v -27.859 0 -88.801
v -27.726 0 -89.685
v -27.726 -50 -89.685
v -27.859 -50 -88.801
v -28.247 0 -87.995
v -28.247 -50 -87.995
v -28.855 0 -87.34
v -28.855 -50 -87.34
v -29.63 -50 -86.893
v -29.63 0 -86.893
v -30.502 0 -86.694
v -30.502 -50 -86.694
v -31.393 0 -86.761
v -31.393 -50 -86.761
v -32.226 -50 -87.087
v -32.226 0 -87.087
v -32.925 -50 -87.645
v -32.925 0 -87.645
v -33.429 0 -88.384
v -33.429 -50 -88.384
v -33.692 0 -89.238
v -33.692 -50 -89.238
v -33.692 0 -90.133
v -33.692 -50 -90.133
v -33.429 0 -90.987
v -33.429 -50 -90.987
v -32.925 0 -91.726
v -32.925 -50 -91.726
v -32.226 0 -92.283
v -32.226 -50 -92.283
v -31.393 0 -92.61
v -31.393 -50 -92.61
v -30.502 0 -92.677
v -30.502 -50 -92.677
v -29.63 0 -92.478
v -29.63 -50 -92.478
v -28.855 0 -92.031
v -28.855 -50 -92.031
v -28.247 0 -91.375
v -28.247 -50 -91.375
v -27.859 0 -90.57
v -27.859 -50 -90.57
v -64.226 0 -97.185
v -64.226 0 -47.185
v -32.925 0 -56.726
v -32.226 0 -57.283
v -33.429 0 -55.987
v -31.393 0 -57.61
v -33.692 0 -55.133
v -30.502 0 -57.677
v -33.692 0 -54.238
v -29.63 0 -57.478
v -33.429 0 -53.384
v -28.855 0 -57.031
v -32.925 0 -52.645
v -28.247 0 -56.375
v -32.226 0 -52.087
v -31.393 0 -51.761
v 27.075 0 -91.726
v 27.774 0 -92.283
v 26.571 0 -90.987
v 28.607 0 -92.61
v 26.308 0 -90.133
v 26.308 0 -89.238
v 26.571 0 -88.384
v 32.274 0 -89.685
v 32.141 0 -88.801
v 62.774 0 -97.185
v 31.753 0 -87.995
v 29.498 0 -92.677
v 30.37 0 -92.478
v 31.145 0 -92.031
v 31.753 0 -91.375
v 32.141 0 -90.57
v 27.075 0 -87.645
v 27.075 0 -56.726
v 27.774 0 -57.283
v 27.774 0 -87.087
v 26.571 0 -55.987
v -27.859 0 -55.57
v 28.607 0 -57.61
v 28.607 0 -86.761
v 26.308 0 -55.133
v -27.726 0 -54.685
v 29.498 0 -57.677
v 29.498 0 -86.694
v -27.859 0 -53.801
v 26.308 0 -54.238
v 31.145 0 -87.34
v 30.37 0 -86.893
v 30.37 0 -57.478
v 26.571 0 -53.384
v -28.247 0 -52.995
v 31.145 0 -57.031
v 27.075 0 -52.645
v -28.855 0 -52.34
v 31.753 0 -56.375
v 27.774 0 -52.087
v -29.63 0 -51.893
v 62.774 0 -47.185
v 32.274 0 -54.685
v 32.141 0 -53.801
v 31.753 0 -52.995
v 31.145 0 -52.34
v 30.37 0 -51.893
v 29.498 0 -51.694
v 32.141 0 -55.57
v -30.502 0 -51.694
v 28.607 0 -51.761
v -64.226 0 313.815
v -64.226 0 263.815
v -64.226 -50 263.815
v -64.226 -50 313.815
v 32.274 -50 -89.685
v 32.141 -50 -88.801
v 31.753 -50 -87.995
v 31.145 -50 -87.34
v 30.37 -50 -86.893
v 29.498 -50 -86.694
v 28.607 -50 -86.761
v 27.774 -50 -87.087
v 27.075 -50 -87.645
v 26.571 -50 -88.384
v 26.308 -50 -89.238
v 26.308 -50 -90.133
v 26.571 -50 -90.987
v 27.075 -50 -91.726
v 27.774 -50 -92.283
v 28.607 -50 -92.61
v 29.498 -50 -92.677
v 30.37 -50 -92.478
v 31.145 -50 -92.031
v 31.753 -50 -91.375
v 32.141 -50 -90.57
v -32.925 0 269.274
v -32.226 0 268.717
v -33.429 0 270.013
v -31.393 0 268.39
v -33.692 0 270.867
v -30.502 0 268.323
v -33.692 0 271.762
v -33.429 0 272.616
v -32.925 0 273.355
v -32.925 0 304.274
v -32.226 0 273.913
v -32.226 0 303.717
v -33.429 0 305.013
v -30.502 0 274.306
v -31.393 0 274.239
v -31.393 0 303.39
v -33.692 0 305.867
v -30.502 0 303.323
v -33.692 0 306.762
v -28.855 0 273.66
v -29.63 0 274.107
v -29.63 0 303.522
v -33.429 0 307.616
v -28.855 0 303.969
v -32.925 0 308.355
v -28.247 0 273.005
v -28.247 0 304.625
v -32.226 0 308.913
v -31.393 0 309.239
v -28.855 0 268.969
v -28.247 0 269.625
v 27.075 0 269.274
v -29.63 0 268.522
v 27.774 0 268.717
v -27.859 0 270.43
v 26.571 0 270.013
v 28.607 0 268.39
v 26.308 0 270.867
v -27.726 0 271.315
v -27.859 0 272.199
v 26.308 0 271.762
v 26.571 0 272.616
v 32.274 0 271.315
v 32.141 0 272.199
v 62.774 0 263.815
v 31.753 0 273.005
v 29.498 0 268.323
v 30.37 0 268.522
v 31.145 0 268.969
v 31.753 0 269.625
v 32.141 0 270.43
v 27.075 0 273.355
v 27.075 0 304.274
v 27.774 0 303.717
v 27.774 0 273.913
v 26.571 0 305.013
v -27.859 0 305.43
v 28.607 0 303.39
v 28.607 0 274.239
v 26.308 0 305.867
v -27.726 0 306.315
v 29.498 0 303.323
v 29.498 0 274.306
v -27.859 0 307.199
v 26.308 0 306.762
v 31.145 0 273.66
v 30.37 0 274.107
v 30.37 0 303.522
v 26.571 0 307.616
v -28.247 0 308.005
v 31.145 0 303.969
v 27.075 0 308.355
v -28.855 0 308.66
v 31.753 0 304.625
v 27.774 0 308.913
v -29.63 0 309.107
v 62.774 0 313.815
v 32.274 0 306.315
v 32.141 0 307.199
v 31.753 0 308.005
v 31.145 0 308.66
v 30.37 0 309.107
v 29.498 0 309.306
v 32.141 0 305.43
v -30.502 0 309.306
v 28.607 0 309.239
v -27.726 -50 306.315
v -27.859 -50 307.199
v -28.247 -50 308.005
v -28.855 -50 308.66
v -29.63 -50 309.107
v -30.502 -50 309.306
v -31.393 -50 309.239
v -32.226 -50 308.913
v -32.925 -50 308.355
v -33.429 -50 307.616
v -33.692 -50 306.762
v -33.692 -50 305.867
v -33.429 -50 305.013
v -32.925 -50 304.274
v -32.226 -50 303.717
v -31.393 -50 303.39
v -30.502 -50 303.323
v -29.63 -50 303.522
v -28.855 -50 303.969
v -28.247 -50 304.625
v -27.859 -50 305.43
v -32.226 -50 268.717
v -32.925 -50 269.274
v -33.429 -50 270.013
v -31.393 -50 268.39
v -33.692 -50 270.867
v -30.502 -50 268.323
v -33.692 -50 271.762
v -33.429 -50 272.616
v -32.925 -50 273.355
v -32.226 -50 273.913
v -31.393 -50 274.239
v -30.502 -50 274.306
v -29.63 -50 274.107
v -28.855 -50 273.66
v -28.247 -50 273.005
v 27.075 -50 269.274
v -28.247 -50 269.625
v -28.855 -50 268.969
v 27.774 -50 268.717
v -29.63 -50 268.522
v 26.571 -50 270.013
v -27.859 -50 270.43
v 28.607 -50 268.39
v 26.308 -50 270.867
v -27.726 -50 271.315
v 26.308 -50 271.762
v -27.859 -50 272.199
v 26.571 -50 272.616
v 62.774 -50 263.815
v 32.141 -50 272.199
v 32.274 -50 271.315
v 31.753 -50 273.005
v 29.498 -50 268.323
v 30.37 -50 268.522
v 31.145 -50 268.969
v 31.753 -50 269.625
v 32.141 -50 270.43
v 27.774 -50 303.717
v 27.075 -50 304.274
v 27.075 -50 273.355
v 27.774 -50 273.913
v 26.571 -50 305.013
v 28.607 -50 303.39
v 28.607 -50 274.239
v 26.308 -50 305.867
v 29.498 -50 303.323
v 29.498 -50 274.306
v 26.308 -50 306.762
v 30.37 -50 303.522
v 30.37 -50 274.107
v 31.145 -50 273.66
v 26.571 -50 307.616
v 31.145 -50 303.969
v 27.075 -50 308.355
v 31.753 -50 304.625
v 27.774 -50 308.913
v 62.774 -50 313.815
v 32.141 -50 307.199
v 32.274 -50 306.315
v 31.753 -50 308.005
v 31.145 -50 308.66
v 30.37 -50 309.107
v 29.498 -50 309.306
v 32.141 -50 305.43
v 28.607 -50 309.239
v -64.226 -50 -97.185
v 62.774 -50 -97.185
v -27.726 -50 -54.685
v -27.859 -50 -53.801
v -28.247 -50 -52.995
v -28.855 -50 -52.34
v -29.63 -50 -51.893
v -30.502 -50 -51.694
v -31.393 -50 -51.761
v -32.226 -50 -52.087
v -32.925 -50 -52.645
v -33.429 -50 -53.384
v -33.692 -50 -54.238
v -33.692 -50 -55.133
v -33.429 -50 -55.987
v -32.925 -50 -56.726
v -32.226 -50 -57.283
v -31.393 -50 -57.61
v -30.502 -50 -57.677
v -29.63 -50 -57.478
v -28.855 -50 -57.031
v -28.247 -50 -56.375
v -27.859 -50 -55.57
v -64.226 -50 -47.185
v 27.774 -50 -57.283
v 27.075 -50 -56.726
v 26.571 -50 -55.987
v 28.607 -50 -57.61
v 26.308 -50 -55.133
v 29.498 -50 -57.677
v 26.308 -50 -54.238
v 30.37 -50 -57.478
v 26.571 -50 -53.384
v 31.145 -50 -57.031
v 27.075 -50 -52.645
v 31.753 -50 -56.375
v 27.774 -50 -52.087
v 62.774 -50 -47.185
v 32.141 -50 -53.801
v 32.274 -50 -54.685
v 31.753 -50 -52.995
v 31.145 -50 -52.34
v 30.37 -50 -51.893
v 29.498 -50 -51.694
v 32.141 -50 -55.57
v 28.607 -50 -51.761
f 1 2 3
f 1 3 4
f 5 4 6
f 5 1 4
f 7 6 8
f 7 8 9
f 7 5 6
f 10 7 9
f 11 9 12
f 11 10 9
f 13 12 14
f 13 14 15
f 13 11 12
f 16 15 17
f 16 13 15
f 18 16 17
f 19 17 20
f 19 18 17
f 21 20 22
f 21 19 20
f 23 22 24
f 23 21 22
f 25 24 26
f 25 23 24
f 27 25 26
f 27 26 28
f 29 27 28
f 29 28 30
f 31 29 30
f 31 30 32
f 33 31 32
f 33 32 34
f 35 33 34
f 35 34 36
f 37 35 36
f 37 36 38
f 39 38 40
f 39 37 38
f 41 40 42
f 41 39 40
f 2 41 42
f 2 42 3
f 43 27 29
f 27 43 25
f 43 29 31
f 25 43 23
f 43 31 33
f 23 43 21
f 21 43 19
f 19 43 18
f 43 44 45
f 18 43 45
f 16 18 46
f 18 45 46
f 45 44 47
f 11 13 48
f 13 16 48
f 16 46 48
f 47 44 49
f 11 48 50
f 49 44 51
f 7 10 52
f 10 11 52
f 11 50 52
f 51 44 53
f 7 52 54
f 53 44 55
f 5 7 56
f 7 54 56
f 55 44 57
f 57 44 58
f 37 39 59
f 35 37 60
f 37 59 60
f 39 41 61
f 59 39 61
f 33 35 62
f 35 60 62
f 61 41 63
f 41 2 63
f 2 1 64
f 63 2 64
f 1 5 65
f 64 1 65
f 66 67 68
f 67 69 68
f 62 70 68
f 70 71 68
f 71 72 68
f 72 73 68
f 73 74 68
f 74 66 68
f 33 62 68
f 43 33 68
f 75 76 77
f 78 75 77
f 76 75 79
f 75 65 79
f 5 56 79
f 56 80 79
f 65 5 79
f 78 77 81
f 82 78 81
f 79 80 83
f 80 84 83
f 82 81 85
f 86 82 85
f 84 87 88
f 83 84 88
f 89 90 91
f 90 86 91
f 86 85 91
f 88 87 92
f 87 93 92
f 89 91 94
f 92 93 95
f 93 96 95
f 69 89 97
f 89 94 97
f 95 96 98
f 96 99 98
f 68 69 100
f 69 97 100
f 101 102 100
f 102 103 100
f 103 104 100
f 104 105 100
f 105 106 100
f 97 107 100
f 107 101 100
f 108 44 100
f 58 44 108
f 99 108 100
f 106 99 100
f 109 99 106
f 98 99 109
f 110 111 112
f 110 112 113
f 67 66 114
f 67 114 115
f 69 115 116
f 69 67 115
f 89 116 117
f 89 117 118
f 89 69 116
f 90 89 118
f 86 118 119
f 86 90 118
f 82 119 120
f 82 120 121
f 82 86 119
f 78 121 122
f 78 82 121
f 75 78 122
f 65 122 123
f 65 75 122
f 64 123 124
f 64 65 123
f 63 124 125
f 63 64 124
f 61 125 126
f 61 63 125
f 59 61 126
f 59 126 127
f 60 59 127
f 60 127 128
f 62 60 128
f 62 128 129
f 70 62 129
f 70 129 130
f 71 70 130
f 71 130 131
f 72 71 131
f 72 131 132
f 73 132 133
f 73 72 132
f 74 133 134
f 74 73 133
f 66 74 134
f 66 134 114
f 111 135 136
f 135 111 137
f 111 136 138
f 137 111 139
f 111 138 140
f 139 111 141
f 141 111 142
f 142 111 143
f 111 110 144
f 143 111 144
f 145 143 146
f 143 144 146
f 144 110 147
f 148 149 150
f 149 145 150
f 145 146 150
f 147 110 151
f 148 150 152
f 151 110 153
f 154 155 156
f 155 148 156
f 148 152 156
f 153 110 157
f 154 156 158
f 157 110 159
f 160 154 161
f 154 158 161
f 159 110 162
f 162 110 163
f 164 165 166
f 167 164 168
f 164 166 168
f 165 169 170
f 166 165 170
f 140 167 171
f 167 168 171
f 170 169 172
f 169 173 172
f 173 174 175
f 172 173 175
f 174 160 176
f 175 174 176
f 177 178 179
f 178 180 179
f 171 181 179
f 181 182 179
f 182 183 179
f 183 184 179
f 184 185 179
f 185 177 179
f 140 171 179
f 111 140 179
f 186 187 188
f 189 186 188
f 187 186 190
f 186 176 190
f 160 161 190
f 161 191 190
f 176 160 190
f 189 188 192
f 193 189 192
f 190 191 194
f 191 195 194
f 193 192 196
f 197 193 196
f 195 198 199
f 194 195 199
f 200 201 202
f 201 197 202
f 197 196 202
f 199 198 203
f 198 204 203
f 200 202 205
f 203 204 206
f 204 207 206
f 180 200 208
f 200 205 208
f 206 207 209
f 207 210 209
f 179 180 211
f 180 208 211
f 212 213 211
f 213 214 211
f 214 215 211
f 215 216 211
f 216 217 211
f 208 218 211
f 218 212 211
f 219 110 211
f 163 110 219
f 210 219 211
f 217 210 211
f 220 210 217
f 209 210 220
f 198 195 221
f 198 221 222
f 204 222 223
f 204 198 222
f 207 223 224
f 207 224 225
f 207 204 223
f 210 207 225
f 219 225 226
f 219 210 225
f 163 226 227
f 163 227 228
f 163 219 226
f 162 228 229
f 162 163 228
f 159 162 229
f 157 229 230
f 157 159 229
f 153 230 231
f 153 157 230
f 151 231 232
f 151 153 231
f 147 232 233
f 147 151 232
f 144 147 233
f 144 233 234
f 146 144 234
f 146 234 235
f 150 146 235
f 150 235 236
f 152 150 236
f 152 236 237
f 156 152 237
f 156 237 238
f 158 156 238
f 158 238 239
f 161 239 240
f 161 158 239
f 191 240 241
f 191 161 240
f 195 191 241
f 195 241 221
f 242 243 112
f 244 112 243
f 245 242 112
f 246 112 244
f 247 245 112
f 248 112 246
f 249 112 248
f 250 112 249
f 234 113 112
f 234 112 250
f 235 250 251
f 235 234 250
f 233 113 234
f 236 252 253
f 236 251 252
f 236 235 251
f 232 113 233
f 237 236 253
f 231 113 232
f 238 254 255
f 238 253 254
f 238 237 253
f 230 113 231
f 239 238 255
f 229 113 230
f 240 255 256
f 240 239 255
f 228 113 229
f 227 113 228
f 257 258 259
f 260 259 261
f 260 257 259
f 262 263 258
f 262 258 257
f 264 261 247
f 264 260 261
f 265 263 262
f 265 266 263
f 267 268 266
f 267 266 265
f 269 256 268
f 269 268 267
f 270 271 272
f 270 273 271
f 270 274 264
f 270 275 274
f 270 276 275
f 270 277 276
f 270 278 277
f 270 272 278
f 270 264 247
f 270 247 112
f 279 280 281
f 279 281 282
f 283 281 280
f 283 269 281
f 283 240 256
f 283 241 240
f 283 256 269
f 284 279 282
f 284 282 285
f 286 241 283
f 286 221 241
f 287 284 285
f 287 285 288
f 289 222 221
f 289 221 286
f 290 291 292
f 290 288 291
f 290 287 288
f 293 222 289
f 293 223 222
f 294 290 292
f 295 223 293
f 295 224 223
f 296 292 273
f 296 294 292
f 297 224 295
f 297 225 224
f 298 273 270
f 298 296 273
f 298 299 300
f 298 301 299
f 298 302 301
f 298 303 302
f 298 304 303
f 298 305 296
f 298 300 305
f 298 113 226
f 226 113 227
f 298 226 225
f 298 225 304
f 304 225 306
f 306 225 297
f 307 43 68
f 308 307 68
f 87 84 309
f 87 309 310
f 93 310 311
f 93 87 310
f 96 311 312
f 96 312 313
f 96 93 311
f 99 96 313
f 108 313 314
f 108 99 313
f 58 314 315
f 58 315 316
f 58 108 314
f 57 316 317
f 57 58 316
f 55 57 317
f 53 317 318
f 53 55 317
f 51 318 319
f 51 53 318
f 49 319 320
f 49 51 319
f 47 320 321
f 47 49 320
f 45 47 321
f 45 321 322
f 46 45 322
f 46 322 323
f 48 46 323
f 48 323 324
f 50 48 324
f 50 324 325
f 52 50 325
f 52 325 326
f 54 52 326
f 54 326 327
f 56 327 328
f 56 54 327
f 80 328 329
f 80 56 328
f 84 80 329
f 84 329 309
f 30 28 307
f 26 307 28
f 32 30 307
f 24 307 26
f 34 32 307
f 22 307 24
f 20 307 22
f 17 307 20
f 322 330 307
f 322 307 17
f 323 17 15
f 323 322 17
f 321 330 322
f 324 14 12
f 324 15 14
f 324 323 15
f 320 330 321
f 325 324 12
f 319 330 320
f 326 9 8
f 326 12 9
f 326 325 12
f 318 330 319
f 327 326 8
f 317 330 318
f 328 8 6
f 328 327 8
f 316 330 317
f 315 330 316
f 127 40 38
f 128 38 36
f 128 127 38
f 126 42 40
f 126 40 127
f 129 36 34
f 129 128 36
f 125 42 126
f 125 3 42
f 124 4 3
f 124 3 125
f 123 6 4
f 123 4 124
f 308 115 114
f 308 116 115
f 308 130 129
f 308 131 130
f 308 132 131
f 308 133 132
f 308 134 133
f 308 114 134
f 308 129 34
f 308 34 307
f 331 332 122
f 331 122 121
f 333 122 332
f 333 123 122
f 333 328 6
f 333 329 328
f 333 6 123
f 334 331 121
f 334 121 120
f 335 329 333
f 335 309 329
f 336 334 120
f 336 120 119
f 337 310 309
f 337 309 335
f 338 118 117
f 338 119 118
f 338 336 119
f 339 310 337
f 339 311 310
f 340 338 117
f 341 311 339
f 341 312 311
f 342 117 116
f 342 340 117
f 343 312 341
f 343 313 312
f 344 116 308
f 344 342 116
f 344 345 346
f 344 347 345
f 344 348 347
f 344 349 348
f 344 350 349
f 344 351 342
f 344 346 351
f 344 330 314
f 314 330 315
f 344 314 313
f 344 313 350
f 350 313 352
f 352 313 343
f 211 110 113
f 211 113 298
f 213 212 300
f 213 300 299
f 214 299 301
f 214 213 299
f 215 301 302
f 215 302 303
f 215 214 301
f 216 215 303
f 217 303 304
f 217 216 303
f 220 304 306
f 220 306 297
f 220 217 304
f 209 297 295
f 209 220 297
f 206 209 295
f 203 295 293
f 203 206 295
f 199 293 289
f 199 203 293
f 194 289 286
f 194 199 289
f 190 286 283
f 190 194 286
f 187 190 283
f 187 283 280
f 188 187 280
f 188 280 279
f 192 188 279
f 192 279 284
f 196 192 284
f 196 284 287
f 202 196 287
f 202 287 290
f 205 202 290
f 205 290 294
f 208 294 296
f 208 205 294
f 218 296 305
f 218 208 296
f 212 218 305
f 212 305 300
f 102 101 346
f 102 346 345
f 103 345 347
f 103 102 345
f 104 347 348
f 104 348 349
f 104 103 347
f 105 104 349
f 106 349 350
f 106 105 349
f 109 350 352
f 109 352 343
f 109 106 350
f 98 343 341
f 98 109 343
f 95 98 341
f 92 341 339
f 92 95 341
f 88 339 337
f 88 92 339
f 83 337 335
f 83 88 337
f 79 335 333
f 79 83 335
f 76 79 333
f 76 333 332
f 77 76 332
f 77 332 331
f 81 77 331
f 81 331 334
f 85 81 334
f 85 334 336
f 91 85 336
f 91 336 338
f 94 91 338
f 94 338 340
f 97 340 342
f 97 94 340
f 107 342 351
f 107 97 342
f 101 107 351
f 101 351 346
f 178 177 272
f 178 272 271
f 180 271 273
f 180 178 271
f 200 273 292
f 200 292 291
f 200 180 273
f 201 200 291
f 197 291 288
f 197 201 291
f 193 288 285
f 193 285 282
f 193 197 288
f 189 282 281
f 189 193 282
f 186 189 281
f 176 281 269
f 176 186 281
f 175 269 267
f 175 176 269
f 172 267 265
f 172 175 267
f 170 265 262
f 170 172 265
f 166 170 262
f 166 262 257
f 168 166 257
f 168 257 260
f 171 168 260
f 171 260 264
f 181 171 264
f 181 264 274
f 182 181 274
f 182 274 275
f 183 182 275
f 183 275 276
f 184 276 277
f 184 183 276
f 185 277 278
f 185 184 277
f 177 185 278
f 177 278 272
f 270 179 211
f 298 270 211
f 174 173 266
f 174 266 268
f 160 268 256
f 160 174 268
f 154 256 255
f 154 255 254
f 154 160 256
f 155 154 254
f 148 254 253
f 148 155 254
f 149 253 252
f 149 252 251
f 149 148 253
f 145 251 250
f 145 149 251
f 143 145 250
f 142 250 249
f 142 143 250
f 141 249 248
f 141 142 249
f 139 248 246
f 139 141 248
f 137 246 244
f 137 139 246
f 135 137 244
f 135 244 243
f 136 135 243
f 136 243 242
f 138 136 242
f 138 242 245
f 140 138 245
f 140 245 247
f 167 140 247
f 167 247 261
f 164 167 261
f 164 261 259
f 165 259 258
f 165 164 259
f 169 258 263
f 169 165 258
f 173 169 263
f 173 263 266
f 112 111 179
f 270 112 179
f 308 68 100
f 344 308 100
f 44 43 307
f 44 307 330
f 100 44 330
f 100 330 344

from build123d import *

# Parameters (mm, degrees)
F0_W     = 127
F0_H     = 50
F0_R     = 3
F1_DEPTH = 50


with BuildPart() as f1:
    # F0 (on Front) → F1 (new body)
    with BuildSketch(Plane.XZ):
        with Locations((-0.725808, -72.185411)):
            Rectangle(F0_W, F0_H)
        with Locations((-30.725808, -89.685411)):
            Circle(F0_R, mode=Mode.SUBTRACT)
        with Locations((-30.725808, -54.685411)):
            Circle(F0_R, mode=Mode.SUBTRACT)
        with Locations((29.274192, -89.685411)):
            Circle(F0_R, mode=Mode.SUBTRACT)
        with Locations((29.274192, -54.685411)):
            Circle(F0_R, mode=Mode.SUBTRACT)
        with Locations((-0.725808, 288.814589)):
            Rectangle(F0_W, F0_H)
        with Locations((-30.725808, 271.314589)):
            Circle(F0_R, mode=Mode.SUBTRACT)
        with Locations((-30.725808, 306.314589)):
            Circle(F0_R, mode=Mode.SUBTRACT)
        with Locations((29.274192, 271.314589)):
            Circle(F0_R, mode=Mode.SUBTRACT)
        with Locations((29.274192, 306.314589)):
            Circle(F0_R, mode=Mode.SUBTRACT)
    extrude(amount=F1_DEPTH)


solid = f1.part
